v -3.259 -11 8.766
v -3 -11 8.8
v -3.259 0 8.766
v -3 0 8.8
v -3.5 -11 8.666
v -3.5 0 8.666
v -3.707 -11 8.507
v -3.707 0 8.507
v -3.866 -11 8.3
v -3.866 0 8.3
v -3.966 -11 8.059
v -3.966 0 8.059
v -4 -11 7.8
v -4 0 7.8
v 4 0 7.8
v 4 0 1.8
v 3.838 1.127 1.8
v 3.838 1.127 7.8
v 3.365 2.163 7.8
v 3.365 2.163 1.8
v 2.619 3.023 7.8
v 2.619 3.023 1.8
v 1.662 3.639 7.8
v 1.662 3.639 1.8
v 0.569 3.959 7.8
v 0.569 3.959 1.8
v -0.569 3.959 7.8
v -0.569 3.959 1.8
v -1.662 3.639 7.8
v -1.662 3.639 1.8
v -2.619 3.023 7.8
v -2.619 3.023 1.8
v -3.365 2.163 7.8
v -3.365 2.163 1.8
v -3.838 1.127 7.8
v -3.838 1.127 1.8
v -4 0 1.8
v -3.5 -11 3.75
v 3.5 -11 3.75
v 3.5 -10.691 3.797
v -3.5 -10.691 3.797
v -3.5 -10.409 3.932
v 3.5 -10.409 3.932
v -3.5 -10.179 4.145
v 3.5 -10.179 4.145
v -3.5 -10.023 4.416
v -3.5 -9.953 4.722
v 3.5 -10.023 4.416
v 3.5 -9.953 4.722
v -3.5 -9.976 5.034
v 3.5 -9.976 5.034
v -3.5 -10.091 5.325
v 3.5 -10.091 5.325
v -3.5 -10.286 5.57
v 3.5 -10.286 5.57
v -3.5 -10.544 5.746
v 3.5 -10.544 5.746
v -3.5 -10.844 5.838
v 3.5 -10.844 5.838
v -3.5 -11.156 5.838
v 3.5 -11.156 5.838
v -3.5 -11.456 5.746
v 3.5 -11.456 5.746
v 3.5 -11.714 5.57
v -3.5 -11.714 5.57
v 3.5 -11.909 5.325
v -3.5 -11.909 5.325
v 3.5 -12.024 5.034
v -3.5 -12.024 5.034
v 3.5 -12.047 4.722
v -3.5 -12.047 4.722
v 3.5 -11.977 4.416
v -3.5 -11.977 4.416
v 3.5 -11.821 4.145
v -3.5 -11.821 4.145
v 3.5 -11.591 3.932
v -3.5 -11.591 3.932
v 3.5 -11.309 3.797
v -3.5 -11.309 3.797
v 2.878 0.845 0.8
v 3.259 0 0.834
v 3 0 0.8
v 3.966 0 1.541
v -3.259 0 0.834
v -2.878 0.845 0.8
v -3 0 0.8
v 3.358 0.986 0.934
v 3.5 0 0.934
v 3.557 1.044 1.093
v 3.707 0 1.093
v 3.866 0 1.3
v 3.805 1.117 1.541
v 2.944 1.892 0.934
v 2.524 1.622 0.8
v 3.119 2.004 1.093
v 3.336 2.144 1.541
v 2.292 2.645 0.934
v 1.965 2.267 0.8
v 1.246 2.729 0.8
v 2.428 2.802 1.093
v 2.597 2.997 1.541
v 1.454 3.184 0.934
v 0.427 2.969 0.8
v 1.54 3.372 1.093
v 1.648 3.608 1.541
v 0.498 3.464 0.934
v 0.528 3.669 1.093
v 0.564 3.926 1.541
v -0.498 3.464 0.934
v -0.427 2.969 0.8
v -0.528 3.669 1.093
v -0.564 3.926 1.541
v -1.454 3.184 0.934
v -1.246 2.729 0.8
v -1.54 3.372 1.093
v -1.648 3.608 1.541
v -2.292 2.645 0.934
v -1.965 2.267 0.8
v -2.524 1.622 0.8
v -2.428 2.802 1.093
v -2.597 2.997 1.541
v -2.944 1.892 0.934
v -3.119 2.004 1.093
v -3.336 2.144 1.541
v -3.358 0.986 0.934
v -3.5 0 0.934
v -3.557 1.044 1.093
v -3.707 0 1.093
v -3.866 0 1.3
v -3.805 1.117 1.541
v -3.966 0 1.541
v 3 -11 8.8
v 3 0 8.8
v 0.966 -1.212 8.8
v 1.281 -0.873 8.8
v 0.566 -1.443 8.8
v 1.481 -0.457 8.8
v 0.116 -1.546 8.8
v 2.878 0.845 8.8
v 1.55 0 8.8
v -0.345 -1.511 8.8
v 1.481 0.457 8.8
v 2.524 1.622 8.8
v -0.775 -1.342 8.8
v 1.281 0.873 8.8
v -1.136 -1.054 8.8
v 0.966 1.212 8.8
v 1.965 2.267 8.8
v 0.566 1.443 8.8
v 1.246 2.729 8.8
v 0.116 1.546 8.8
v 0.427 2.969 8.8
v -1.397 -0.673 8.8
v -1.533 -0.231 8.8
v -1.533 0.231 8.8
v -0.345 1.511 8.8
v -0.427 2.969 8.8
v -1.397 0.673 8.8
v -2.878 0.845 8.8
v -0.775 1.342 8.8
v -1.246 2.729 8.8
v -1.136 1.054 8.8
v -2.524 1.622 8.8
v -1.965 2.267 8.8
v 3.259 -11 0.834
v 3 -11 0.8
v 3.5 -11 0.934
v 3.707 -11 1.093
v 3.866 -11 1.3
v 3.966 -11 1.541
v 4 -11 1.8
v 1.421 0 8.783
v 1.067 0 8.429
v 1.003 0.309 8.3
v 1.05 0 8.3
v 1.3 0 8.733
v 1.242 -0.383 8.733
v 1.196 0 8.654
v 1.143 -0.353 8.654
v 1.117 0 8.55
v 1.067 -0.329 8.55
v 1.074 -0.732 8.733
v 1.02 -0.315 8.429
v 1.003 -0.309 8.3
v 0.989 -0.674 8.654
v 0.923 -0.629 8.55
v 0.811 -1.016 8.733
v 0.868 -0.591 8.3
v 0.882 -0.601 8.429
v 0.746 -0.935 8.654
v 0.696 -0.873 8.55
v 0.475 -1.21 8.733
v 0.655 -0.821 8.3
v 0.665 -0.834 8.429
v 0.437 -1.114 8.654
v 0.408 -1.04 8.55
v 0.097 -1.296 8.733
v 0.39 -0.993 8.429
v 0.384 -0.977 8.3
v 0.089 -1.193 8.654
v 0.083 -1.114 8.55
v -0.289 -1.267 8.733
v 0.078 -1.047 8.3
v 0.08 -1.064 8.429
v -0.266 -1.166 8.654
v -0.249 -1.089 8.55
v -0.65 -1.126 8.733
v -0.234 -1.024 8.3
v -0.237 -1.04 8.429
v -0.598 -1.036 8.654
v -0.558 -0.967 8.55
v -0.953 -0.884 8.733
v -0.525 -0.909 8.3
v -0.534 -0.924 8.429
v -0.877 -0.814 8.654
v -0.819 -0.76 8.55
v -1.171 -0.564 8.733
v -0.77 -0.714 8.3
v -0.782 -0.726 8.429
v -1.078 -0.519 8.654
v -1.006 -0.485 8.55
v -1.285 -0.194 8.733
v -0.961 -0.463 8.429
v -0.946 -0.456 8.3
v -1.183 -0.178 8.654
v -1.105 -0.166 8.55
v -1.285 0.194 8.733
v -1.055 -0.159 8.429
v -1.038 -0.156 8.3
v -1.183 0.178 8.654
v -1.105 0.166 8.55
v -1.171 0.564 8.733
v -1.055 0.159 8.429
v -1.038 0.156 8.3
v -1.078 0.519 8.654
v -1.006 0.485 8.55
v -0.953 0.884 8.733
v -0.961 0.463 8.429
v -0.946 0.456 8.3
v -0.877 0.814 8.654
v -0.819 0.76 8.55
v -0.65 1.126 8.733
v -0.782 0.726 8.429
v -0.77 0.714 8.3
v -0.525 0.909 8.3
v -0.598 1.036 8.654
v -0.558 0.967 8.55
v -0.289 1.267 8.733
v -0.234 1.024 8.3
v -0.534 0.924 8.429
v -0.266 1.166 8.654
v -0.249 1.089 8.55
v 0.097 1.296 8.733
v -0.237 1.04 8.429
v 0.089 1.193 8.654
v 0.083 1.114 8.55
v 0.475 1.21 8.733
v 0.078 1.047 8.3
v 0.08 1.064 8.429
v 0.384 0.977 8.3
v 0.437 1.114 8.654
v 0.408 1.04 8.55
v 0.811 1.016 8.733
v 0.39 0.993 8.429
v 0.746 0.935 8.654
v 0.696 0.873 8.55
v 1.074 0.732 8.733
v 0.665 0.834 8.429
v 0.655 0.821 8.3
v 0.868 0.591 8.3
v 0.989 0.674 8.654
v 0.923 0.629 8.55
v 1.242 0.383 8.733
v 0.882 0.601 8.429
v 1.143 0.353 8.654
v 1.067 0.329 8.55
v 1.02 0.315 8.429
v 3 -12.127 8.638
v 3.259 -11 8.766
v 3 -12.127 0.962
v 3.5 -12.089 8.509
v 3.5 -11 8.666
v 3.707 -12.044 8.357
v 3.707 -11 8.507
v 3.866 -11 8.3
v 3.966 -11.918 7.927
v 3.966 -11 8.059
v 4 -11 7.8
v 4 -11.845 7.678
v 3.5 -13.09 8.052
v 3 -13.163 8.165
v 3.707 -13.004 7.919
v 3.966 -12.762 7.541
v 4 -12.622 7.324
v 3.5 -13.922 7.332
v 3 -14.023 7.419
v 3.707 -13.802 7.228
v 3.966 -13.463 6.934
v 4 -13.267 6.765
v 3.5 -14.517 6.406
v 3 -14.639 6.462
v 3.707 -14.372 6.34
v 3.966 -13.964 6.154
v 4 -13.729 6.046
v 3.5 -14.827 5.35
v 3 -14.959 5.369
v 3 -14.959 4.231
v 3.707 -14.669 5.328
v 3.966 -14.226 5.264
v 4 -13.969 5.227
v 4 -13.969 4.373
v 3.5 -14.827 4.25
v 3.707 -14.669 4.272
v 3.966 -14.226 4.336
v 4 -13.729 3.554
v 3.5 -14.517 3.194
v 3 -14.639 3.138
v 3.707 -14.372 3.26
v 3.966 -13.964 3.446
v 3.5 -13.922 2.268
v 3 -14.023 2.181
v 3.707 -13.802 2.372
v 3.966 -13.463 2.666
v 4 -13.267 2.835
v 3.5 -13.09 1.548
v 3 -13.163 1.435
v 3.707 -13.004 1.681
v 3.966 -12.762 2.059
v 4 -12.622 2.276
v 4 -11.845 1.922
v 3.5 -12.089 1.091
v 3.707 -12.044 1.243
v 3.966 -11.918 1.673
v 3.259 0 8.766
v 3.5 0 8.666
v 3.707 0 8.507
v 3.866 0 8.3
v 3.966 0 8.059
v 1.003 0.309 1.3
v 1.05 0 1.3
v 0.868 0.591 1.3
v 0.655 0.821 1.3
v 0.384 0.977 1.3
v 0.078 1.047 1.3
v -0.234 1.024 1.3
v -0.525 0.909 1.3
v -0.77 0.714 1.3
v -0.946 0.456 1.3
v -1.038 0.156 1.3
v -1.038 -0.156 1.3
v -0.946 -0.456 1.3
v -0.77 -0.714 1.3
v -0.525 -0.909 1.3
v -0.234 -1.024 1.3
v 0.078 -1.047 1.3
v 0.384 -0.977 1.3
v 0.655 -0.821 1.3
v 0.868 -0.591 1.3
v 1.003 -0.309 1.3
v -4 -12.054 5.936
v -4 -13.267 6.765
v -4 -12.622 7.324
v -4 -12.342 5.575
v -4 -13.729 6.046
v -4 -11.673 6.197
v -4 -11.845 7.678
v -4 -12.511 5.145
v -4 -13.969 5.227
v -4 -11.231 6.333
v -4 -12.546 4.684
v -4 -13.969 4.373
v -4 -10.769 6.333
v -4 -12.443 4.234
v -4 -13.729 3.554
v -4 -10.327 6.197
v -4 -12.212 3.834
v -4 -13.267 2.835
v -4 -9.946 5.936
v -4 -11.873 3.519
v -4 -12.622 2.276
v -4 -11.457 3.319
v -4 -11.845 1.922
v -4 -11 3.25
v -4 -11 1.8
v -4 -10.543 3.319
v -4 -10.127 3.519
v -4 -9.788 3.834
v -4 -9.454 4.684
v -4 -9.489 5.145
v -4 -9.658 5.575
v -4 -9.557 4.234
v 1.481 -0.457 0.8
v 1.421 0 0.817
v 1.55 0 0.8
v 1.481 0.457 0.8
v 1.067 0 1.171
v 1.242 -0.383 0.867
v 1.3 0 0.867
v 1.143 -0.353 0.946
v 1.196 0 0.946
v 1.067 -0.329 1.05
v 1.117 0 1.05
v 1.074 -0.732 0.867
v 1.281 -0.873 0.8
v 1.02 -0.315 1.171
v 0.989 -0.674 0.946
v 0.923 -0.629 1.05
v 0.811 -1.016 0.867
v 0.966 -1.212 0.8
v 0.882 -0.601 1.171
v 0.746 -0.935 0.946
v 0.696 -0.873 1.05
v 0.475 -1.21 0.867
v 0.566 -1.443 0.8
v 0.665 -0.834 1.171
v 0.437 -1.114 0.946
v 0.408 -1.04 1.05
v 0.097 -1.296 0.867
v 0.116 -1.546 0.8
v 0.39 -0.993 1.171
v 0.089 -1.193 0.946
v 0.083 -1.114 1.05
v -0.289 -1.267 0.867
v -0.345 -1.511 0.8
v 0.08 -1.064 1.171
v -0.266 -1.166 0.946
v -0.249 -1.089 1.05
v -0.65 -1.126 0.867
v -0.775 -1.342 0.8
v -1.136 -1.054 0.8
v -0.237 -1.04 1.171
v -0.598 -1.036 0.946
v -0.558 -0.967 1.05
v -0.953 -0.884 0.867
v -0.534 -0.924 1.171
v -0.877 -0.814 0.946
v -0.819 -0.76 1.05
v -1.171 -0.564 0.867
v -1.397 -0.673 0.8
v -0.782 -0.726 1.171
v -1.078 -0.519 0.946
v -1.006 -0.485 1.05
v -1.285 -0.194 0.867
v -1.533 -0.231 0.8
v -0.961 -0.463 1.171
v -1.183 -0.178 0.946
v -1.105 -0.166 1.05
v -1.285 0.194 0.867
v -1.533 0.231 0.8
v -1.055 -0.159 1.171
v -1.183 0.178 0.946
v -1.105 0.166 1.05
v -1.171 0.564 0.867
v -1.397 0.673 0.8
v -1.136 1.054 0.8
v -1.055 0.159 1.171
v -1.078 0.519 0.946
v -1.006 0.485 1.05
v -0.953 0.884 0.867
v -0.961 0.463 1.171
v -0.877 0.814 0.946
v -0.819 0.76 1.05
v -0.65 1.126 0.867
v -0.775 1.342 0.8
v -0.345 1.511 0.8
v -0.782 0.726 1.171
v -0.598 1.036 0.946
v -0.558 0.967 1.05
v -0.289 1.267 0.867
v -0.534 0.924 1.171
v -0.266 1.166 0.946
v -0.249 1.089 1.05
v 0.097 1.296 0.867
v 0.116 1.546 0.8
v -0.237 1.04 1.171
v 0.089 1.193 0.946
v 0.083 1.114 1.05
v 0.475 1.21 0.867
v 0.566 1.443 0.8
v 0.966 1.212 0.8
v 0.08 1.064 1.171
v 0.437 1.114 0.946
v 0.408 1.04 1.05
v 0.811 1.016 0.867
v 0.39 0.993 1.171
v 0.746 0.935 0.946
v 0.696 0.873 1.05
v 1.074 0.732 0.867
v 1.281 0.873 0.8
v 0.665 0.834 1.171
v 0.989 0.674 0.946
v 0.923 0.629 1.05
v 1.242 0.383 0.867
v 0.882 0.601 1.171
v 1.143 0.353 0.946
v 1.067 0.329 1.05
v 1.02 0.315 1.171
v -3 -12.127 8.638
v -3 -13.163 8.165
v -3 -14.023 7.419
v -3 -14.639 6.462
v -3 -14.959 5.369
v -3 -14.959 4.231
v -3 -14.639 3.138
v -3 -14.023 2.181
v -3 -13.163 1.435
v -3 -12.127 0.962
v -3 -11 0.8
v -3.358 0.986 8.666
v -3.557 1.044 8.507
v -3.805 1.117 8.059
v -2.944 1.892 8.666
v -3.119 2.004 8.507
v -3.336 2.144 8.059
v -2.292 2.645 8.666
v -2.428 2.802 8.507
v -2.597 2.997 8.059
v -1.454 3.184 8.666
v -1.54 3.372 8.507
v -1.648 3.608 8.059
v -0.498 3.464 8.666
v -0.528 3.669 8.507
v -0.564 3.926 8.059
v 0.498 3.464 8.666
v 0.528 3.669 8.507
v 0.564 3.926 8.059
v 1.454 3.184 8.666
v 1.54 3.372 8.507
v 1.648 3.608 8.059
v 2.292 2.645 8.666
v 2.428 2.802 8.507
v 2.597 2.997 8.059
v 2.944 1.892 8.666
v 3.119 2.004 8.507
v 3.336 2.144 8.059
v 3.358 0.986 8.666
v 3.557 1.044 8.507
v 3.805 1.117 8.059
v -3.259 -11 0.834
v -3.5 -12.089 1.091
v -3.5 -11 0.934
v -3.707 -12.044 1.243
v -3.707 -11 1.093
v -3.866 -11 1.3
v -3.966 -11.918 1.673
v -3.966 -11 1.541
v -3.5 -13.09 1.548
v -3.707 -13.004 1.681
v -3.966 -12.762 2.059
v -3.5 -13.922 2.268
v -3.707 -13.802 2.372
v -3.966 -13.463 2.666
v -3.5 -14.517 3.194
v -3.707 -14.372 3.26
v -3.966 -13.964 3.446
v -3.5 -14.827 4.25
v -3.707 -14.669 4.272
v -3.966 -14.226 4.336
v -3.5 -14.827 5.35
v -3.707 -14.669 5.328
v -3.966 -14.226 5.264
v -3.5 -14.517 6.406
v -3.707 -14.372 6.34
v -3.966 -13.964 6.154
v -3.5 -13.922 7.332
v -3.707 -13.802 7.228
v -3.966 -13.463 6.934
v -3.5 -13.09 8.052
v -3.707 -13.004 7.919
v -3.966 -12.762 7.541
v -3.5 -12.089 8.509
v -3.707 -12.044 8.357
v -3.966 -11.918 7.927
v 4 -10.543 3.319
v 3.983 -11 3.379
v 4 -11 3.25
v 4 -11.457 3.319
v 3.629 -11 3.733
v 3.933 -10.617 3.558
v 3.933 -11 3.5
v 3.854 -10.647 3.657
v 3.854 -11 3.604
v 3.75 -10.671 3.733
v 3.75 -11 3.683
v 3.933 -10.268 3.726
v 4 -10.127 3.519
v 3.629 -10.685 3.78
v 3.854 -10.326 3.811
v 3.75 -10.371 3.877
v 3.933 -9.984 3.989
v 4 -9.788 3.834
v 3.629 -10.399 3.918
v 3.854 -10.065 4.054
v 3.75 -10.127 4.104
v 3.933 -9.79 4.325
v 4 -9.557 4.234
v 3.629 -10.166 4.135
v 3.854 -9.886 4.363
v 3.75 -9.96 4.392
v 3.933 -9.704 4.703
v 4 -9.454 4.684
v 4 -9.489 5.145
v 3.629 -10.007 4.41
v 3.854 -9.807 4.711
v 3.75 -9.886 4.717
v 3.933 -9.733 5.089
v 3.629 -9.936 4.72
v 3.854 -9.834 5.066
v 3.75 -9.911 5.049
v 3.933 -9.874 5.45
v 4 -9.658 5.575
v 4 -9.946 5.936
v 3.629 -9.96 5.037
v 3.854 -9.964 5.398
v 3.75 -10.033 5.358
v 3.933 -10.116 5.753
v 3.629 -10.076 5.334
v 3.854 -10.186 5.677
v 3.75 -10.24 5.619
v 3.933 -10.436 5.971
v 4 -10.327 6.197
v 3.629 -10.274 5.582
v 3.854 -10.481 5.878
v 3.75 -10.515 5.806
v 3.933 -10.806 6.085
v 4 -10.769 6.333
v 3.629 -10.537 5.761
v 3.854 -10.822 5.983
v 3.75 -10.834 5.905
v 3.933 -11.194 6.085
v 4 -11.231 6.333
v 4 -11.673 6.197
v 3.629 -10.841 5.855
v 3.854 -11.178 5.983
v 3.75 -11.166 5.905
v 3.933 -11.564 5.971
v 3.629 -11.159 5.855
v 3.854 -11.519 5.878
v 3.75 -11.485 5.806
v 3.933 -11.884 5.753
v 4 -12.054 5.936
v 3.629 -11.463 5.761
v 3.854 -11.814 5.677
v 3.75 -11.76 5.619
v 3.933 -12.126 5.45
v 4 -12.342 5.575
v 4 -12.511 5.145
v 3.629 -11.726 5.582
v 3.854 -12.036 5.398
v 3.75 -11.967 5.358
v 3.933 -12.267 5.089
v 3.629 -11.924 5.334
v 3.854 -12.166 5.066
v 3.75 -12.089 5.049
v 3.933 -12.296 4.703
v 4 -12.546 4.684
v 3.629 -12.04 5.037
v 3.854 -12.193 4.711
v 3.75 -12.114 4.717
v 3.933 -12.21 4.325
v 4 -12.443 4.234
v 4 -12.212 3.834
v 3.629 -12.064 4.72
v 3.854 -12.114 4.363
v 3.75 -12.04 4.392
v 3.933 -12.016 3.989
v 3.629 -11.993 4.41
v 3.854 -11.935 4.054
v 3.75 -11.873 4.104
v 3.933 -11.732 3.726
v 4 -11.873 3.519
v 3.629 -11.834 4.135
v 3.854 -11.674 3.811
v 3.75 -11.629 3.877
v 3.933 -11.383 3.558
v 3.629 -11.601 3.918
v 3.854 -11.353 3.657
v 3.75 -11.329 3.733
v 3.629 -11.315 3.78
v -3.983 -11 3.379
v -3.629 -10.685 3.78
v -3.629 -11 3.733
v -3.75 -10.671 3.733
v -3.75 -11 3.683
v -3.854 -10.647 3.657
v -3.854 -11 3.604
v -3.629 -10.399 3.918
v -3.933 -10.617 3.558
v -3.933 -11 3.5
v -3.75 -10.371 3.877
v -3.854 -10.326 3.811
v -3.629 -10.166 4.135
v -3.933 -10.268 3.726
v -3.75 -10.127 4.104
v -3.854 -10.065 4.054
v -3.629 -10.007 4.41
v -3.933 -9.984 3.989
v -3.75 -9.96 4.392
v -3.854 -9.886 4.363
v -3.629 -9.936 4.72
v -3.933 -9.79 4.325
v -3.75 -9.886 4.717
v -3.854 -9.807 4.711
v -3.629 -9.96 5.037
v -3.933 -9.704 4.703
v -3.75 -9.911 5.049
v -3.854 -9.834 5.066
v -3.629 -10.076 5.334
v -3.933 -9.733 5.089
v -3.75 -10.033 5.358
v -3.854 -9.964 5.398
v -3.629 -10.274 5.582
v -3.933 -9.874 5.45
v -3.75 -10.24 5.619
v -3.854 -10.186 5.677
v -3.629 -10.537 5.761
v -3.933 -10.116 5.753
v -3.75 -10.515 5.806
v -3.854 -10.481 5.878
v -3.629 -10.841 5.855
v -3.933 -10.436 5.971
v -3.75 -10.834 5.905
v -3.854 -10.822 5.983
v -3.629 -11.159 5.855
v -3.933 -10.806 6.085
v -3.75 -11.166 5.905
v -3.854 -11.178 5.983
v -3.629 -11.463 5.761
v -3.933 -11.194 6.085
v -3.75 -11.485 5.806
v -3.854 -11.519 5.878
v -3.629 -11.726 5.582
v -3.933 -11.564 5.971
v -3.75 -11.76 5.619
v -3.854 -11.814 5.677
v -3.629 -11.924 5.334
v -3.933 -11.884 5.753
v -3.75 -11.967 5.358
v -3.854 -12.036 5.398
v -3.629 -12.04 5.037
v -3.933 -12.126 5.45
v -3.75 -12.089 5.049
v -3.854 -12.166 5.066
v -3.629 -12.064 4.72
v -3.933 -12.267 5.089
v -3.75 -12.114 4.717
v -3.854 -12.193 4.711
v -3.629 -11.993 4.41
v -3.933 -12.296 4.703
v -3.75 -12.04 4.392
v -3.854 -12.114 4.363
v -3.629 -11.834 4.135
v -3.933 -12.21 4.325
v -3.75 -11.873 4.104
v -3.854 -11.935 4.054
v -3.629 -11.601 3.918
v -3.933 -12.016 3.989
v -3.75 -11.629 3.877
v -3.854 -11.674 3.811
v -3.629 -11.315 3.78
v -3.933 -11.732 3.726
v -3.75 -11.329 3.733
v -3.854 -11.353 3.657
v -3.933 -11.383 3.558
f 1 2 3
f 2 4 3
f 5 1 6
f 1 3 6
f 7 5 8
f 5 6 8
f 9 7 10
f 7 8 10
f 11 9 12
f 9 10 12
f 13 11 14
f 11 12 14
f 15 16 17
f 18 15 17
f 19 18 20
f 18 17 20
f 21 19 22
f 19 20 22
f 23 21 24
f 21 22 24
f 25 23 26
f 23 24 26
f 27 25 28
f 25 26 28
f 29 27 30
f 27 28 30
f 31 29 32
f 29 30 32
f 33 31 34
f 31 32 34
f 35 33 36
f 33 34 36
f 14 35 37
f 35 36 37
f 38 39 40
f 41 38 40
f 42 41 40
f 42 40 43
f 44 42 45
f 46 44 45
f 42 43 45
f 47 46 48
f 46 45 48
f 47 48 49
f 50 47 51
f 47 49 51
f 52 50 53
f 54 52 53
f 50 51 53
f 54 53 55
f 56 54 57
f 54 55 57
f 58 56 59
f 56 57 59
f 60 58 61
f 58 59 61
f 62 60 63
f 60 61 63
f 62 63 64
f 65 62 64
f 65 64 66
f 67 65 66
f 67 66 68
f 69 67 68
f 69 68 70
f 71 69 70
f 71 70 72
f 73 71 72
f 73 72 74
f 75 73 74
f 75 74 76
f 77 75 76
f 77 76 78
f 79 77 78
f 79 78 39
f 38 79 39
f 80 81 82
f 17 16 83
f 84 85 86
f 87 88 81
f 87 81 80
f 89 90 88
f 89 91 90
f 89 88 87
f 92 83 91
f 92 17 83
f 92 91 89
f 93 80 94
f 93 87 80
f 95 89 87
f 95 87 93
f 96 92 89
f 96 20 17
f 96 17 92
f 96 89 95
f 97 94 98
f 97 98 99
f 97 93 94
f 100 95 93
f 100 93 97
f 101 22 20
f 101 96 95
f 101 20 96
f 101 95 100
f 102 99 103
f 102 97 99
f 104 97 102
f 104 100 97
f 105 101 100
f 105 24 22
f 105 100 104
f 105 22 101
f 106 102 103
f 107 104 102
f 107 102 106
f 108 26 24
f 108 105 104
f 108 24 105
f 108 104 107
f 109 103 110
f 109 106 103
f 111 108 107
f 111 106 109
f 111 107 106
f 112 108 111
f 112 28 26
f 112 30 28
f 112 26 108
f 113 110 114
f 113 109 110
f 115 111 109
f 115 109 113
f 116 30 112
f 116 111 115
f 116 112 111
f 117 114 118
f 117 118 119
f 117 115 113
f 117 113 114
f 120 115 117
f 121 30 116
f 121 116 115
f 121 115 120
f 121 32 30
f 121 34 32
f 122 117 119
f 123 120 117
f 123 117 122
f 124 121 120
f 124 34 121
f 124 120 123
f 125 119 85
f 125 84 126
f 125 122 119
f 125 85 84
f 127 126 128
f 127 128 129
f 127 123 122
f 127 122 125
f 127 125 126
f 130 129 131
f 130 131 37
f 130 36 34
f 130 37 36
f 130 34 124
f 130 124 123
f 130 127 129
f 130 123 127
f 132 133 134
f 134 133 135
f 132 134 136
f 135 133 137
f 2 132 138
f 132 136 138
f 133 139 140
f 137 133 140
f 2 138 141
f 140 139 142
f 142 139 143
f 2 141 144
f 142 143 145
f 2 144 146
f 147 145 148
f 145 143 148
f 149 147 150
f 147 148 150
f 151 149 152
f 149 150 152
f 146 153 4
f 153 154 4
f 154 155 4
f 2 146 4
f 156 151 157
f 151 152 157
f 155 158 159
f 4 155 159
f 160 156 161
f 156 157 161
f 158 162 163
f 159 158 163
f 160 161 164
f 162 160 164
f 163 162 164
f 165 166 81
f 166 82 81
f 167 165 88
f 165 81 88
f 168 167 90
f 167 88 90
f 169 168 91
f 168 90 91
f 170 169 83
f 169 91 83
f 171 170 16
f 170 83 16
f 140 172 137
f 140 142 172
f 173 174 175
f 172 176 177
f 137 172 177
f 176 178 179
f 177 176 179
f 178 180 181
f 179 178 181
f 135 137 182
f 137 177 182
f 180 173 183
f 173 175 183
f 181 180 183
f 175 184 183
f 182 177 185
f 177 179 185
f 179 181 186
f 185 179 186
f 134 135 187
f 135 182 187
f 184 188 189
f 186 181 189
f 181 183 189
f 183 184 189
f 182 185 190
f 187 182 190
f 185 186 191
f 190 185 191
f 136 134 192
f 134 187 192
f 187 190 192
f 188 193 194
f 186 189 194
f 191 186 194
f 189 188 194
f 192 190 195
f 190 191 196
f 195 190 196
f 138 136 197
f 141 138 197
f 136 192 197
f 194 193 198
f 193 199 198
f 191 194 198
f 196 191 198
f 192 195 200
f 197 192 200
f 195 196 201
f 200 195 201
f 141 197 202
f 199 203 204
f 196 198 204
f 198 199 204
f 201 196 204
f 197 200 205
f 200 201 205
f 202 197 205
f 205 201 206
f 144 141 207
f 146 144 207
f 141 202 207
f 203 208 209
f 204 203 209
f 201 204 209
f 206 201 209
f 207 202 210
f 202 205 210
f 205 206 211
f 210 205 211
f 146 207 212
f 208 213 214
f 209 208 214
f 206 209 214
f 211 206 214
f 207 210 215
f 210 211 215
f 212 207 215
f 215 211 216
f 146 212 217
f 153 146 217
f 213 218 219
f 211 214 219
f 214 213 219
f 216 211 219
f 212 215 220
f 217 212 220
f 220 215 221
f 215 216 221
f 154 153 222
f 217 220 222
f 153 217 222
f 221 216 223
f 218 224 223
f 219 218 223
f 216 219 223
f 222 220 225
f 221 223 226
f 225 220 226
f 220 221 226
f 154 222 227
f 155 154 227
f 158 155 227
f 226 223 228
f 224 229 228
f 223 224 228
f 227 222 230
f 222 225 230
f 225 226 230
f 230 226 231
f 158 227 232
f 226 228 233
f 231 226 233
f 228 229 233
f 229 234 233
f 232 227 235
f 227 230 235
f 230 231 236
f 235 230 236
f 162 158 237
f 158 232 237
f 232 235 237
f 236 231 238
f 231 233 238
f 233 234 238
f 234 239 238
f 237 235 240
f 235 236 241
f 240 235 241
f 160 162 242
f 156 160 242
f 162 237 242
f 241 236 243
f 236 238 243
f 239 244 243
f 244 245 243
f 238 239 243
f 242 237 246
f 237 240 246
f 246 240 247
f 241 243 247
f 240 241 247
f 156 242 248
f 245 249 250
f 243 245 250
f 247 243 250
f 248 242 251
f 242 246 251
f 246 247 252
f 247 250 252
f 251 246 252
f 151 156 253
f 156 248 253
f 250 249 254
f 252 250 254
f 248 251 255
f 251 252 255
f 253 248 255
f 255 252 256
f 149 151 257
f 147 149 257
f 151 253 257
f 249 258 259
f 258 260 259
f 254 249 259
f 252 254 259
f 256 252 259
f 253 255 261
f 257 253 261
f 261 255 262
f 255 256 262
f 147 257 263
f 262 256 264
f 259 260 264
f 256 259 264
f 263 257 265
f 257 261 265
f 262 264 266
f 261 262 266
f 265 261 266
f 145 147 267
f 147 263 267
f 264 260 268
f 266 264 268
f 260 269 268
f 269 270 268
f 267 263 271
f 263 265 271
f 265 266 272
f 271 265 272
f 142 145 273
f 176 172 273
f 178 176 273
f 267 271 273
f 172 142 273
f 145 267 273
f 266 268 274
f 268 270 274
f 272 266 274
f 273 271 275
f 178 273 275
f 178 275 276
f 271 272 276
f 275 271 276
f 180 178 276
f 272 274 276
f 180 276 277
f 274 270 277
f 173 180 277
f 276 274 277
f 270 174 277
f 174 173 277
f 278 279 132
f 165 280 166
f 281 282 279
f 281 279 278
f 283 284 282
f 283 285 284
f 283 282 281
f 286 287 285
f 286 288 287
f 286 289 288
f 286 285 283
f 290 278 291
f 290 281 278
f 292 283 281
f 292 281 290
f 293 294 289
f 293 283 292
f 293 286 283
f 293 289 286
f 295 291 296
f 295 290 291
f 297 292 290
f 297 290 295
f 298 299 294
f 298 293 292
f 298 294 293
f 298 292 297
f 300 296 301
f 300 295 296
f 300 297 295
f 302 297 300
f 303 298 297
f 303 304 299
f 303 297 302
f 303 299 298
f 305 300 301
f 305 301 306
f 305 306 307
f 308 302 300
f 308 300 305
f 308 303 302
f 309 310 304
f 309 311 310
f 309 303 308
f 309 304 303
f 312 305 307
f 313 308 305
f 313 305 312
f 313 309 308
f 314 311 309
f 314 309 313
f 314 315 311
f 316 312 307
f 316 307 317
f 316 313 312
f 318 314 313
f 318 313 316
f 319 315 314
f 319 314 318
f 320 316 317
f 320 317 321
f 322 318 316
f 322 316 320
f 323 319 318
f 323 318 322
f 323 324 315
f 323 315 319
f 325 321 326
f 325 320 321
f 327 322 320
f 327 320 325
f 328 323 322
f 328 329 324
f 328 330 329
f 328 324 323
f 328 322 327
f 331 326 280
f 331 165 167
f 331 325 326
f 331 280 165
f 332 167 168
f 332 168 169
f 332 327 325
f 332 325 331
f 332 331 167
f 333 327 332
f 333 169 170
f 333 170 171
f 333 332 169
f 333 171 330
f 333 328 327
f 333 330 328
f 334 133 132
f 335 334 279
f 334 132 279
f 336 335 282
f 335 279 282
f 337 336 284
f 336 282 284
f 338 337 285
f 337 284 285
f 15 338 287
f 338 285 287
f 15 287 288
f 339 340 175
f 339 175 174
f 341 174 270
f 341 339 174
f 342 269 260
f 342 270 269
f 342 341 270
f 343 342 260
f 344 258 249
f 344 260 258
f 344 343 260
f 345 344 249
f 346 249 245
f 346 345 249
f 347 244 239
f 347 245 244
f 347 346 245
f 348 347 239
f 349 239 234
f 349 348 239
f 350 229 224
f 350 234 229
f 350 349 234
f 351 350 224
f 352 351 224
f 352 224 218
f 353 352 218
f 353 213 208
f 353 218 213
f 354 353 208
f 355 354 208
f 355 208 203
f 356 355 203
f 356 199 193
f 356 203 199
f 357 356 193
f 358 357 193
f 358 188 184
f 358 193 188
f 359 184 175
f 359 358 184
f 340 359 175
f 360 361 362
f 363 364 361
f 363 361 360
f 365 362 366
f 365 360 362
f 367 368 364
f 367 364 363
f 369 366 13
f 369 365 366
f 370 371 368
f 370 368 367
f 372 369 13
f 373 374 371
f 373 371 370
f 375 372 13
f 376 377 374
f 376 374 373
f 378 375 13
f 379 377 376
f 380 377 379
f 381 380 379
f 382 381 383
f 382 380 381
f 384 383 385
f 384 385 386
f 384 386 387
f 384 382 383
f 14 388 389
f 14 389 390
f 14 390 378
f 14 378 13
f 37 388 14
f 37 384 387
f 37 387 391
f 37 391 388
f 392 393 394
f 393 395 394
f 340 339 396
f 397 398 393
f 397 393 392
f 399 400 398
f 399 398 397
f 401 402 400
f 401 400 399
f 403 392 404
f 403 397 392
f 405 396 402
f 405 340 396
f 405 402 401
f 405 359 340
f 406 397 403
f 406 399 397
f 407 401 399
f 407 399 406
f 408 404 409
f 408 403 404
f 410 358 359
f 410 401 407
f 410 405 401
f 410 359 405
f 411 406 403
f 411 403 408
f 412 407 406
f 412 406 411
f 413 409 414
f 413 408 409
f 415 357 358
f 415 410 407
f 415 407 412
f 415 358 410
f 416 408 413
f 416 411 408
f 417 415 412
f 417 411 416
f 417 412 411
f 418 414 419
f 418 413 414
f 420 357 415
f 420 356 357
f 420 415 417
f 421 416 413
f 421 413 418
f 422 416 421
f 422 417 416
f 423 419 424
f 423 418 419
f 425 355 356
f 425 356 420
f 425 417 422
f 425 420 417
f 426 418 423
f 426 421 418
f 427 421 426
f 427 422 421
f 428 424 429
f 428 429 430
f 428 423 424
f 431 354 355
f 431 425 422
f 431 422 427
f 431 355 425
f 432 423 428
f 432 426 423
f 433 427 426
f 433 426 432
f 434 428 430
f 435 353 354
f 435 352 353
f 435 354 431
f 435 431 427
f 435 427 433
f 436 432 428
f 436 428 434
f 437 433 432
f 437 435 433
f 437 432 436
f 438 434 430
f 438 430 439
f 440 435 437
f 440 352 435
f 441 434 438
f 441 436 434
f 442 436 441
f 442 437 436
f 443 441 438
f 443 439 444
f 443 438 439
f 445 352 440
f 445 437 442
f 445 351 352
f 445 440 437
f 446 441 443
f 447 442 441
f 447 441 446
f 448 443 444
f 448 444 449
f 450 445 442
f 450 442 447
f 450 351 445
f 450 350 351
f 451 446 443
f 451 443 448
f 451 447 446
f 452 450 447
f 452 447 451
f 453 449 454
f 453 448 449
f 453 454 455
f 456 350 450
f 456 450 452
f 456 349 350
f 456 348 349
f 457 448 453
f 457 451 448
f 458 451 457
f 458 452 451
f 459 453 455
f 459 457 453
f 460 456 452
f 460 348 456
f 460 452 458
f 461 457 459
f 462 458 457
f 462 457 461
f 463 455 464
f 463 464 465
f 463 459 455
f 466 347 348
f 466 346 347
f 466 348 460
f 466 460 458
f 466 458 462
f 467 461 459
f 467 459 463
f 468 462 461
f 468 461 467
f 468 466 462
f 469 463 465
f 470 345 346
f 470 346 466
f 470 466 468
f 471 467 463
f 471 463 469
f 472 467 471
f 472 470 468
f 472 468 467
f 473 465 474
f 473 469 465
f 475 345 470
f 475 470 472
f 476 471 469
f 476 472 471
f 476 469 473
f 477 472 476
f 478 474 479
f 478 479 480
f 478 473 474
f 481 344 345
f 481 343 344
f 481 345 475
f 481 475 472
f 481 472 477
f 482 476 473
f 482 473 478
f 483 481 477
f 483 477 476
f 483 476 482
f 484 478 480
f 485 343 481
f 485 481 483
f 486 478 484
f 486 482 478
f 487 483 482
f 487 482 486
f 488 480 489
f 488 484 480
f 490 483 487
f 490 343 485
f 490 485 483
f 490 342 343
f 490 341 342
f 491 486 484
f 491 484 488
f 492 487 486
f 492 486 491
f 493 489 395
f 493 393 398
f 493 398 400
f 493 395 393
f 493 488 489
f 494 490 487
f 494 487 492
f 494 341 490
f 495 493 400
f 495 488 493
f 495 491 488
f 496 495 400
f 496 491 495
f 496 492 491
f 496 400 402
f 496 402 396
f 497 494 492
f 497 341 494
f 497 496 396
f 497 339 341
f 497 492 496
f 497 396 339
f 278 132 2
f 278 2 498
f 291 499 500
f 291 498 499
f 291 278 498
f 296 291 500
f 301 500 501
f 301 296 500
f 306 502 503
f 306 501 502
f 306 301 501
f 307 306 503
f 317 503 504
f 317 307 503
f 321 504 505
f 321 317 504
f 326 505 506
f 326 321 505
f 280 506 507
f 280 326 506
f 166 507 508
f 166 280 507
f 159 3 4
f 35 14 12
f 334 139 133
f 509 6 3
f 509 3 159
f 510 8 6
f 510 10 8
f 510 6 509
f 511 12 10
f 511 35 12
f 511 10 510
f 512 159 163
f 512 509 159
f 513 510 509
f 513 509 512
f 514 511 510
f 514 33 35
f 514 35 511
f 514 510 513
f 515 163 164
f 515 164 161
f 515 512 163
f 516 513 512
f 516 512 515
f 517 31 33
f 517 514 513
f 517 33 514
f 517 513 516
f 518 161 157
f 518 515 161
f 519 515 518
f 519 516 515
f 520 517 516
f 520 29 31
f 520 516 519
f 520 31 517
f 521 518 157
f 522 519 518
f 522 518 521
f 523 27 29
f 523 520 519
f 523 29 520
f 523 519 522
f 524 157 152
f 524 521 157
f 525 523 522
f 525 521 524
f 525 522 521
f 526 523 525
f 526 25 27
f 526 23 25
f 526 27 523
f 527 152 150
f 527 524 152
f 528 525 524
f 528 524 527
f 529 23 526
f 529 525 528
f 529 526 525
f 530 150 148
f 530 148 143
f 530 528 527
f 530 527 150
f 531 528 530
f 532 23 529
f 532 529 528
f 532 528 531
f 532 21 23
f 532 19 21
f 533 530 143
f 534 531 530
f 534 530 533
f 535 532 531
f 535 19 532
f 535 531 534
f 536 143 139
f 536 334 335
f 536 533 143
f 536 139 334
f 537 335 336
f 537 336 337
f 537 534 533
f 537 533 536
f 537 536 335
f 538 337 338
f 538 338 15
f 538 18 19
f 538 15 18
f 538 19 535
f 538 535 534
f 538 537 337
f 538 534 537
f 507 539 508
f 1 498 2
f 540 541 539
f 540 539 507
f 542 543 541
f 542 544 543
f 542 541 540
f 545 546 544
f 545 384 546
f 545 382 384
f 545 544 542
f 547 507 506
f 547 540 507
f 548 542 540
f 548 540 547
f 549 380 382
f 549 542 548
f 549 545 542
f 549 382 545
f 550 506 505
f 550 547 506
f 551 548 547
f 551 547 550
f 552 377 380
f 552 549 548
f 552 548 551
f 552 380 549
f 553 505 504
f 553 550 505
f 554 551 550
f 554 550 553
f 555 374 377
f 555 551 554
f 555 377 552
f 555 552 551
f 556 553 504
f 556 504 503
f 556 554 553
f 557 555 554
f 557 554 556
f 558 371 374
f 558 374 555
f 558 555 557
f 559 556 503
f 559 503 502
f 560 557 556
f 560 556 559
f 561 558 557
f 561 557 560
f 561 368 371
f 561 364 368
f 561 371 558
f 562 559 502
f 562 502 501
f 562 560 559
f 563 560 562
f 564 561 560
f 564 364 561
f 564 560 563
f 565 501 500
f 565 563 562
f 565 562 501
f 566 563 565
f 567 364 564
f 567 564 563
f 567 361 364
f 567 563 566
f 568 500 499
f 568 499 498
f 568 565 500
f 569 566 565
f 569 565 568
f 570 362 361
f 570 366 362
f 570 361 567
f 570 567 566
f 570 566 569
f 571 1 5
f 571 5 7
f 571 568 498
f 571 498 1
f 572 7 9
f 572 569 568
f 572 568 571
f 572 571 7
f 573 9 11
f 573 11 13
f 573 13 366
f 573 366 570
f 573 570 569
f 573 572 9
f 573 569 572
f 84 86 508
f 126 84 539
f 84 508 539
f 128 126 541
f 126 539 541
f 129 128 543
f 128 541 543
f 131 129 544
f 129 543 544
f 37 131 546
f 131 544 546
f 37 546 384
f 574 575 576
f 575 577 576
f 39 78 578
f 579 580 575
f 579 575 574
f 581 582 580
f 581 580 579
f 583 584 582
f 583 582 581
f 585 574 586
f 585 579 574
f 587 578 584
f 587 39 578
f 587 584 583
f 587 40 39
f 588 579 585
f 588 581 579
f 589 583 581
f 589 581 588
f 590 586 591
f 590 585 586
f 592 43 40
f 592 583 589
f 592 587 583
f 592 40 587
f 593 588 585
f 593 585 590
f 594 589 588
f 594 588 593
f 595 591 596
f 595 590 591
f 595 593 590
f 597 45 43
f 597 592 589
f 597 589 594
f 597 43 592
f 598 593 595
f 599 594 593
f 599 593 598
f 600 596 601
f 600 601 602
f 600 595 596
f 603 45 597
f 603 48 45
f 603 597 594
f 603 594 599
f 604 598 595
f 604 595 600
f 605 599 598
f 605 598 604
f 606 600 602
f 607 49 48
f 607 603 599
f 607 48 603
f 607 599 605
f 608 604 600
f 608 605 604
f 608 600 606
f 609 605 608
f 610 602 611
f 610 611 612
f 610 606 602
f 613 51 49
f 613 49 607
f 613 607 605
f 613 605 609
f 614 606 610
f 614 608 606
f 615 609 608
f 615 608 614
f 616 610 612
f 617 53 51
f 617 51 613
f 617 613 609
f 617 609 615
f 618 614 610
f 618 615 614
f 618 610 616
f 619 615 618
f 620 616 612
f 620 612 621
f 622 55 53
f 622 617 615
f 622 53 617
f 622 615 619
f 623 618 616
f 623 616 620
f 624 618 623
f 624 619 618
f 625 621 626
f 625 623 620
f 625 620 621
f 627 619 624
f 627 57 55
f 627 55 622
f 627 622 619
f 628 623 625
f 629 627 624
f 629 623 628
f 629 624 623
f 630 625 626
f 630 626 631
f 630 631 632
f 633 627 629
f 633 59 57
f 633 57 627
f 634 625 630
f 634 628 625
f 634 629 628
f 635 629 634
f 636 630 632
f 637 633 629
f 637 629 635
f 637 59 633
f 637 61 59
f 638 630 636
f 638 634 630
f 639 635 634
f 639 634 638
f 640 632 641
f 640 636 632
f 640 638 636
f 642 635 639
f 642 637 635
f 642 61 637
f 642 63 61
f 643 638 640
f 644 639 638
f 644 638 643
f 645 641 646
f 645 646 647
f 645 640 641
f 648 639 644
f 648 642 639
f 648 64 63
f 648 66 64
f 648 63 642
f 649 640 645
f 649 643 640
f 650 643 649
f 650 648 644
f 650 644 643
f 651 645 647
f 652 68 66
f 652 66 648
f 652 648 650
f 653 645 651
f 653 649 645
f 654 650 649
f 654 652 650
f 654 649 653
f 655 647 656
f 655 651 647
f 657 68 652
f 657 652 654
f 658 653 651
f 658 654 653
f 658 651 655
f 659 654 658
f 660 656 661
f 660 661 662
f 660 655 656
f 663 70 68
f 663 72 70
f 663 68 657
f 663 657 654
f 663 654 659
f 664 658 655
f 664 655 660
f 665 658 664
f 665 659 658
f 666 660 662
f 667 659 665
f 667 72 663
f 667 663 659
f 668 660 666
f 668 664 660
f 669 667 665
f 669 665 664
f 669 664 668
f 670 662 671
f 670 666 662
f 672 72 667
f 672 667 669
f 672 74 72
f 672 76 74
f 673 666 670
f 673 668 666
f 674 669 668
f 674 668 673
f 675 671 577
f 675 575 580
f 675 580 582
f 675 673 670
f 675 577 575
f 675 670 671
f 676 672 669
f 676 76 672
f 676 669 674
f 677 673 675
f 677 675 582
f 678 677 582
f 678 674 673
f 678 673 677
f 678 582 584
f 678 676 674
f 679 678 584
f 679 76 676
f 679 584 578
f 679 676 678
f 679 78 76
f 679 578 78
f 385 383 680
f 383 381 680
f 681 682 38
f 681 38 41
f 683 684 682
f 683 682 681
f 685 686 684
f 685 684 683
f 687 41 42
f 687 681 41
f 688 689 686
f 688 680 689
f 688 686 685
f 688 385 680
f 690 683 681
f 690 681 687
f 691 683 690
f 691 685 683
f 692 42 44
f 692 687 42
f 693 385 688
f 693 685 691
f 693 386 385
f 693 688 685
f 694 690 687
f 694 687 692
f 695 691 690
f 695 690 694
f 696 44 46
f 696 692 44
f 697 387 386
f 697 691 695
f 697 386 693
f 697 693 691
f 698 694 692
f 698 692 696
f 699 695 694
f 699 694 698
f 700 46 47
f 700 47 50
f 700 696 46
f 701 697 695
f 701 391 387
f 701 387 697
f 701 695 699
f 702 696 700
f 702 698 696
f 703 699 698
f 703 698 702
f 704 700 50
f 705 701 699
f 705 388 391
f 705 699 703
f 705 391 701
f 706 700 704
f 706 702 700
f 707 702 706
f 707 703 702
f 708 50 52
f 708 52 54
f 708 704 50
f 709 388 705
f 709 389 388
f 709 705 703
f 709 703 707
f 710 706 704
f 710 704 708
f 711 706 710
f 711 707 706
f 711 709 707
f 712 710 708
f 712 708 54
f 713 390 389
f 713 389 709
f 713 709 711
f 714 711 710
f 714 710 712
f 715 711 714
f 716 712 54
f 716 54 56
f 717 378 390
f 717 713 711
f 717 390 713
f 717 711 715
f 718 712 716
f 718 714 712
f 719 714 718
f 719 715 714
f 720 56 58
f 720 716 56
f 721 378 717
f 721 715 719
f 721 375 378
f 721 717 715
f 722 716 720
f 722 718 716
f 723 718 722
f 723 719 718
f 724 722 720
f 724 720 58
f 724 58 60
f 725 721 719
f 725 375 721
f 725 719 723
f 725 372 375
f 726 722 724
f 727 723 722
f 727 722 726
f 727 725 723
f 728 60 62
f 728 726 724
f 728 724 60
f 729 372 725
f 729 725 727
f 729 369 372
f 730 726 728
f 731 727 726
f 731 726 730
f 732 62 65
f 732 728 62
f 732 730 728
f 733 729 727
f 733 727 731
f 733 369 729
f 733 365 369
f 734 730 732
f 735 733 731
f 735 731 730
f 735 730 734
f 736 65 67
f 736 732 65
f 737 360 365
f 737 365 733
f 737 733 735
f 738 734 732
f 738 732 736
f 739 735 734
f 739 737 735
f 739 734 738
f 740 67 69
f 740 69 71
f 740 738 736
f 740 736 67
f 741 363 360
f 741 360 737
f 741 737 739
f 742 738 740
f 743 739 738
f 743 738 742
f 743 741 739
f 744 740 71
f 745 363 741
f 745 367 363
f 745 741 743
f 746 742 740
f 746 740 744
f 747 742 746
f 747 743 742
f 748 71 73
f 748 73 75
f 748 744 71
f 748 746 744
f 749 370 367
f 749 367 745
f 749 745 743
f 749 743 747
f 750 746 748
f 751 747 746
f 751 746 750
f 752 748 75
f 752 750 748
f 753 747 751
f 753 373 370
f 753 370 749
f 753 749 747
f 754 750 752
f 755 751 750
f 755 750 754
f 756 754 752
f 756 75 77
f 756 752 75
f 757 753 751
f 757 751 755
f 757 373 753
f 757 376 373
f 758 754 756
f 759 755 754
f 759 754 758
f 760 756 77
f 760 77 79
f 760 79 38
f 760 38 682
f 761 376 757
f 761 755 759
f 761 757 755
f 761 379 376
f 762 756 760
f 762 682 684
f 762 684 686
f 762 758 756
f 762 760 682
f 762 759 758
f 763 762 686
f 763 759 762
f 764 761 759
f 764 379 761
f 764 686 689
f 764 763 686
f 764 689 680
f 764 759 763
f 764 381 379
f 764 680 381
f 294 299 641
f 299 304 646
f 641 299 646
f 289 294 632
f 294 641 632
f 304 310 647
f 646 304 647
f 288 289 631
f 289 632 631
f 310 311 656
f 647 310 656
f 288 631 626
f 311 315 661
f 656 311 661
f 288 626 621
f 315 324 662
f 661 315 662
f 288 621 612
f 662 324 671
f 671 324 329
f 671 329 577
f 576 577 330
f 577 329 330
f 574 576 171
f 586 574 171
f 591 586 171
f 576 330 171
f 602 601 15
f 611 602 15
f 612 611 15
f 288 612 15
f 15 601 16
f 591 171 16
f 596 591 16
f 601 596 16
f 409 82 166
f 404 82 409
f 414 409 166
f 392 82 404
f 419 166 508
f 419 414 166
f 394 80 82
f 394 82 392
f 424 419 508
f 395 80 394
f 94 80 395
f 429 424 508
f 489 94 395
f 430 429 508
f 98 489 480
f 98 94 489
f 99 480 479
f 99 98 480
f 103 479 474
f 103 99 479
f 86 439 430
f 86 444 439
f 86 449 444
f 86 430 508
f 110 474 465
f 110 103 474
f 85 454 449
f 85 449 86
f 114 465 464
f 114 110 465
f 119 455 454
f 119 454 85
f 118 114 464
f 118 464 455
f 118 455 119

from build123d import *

# Parameters (mm, degrees)
BOSS_EXTRUDE1_START = 0.8
SKETCH2_R           = 4
BOSS_EXTRUDE1_DEPTH = 8
SKETCH10_W          = 8
SKETCH10_H          = 11
BOSS_EXTRUDE2_DEPTH = 8
BOSS_EXTRUDE3_START = 4
SKETCH8_R           = 4
BOSS_EXTRUDE3_DEPTH = 8
SKETCH1_R           = 1.05
CUT_EXTRUDE2_DEPTH  = 9.6
CUT_EXTRUDE3_START  = 4.975
SKETCH9_R           = 1.05
CUT_EXTRUDE3_DEPTH  = 9.95
FILLET1_R           = 1
FILLET2_R           = 0.5


with BuildPart() as part:
    # Sketch2 → Boss-Extrude1 (new body)
    with BuildSketch(Plane.XY.offset(BOSS_EXTRUDE1_START)):
        Circle(SKETCH2_R)
    extrude(amount=BOSS_EXTRUDE1_DEPTH)

    # Sketch10 → Boss-Extrude2 (add)
    with BuildSketch(Plane(origin=(0, 0, 0.8), x_dir=(-1, 0, 0), z_dir=(0, 0, -1))):
        with Locations((0, -5.5)):
            Rectangle(SKETCH10_W, SKETCH10_H)
    extrude(amount=-BOSS_EXTRUDE2_DEPTH)

    # Sketch8 → Boss-Extrude3 (add)
    with BuildSketch(Plane(origin=(0, 0, 0), x_dir=(0, 0, -1), z_dir=(1, 0, 0)).offset(BOSS_EXTRUDE3_START)):
        with Locations((-4.8, -11)):
            Circle(SKETCH8_R)
    extrude(amount=-BOSS_EXTRUDE3_DEPTH)

    # Sketch1 → Cut-Extrude2 (cut)
    with BuildSketch(Plane.XY):
        Circle(SKETCH1_R)
    extrude(amount=CUT_EXTRUDE2_DEPTH, mode=Mode.SUBTRACT)

    # Sketch9 → Cut-Extrude3 (cut)
    with BuildSketch(Plane(origin=(0, 0, 0), x_dir=(0, 0, -1), z_dir=(1, 0, 0)).offset(CUT_EXTRUDE3_START)):
        with Locations((-4.8, -11)):
            Circle(SKETCH9_R)
    extrude(amount=-CUT_EXTRUDE3_DEPTH, mode=Mode.SUBTRACT)

    # Fillet1
    fillet1_edges = [part.edges().sort_by_distance(p)[0] for p in [
        (-4, -5.5, 8.8),
        (4, -5.5, 0.8),
        (0, 4, 0.8),
        (-4, -15, 4.8),
        (4, -15, 4.8),
        (0, 4, 8.8),
        (-4, -5.5, 0.8),
        (4, -5.5, 8.8),
    ]]
    fillet(fillet1_edges, radius=FILLET1_R)

    # Fillet2
    fillet2_edges = [part.edges().sort_by_distance(p)[0] for p in [
        (-1.05, 0, 8.8),
        (-1.05, 0, 0.8),
        (-4, -11, 5.85),
        (4, -11, 5.85),
    ]]
    fillet(fillet2_edges, radius=FILLET2_R)


solid = part.part
